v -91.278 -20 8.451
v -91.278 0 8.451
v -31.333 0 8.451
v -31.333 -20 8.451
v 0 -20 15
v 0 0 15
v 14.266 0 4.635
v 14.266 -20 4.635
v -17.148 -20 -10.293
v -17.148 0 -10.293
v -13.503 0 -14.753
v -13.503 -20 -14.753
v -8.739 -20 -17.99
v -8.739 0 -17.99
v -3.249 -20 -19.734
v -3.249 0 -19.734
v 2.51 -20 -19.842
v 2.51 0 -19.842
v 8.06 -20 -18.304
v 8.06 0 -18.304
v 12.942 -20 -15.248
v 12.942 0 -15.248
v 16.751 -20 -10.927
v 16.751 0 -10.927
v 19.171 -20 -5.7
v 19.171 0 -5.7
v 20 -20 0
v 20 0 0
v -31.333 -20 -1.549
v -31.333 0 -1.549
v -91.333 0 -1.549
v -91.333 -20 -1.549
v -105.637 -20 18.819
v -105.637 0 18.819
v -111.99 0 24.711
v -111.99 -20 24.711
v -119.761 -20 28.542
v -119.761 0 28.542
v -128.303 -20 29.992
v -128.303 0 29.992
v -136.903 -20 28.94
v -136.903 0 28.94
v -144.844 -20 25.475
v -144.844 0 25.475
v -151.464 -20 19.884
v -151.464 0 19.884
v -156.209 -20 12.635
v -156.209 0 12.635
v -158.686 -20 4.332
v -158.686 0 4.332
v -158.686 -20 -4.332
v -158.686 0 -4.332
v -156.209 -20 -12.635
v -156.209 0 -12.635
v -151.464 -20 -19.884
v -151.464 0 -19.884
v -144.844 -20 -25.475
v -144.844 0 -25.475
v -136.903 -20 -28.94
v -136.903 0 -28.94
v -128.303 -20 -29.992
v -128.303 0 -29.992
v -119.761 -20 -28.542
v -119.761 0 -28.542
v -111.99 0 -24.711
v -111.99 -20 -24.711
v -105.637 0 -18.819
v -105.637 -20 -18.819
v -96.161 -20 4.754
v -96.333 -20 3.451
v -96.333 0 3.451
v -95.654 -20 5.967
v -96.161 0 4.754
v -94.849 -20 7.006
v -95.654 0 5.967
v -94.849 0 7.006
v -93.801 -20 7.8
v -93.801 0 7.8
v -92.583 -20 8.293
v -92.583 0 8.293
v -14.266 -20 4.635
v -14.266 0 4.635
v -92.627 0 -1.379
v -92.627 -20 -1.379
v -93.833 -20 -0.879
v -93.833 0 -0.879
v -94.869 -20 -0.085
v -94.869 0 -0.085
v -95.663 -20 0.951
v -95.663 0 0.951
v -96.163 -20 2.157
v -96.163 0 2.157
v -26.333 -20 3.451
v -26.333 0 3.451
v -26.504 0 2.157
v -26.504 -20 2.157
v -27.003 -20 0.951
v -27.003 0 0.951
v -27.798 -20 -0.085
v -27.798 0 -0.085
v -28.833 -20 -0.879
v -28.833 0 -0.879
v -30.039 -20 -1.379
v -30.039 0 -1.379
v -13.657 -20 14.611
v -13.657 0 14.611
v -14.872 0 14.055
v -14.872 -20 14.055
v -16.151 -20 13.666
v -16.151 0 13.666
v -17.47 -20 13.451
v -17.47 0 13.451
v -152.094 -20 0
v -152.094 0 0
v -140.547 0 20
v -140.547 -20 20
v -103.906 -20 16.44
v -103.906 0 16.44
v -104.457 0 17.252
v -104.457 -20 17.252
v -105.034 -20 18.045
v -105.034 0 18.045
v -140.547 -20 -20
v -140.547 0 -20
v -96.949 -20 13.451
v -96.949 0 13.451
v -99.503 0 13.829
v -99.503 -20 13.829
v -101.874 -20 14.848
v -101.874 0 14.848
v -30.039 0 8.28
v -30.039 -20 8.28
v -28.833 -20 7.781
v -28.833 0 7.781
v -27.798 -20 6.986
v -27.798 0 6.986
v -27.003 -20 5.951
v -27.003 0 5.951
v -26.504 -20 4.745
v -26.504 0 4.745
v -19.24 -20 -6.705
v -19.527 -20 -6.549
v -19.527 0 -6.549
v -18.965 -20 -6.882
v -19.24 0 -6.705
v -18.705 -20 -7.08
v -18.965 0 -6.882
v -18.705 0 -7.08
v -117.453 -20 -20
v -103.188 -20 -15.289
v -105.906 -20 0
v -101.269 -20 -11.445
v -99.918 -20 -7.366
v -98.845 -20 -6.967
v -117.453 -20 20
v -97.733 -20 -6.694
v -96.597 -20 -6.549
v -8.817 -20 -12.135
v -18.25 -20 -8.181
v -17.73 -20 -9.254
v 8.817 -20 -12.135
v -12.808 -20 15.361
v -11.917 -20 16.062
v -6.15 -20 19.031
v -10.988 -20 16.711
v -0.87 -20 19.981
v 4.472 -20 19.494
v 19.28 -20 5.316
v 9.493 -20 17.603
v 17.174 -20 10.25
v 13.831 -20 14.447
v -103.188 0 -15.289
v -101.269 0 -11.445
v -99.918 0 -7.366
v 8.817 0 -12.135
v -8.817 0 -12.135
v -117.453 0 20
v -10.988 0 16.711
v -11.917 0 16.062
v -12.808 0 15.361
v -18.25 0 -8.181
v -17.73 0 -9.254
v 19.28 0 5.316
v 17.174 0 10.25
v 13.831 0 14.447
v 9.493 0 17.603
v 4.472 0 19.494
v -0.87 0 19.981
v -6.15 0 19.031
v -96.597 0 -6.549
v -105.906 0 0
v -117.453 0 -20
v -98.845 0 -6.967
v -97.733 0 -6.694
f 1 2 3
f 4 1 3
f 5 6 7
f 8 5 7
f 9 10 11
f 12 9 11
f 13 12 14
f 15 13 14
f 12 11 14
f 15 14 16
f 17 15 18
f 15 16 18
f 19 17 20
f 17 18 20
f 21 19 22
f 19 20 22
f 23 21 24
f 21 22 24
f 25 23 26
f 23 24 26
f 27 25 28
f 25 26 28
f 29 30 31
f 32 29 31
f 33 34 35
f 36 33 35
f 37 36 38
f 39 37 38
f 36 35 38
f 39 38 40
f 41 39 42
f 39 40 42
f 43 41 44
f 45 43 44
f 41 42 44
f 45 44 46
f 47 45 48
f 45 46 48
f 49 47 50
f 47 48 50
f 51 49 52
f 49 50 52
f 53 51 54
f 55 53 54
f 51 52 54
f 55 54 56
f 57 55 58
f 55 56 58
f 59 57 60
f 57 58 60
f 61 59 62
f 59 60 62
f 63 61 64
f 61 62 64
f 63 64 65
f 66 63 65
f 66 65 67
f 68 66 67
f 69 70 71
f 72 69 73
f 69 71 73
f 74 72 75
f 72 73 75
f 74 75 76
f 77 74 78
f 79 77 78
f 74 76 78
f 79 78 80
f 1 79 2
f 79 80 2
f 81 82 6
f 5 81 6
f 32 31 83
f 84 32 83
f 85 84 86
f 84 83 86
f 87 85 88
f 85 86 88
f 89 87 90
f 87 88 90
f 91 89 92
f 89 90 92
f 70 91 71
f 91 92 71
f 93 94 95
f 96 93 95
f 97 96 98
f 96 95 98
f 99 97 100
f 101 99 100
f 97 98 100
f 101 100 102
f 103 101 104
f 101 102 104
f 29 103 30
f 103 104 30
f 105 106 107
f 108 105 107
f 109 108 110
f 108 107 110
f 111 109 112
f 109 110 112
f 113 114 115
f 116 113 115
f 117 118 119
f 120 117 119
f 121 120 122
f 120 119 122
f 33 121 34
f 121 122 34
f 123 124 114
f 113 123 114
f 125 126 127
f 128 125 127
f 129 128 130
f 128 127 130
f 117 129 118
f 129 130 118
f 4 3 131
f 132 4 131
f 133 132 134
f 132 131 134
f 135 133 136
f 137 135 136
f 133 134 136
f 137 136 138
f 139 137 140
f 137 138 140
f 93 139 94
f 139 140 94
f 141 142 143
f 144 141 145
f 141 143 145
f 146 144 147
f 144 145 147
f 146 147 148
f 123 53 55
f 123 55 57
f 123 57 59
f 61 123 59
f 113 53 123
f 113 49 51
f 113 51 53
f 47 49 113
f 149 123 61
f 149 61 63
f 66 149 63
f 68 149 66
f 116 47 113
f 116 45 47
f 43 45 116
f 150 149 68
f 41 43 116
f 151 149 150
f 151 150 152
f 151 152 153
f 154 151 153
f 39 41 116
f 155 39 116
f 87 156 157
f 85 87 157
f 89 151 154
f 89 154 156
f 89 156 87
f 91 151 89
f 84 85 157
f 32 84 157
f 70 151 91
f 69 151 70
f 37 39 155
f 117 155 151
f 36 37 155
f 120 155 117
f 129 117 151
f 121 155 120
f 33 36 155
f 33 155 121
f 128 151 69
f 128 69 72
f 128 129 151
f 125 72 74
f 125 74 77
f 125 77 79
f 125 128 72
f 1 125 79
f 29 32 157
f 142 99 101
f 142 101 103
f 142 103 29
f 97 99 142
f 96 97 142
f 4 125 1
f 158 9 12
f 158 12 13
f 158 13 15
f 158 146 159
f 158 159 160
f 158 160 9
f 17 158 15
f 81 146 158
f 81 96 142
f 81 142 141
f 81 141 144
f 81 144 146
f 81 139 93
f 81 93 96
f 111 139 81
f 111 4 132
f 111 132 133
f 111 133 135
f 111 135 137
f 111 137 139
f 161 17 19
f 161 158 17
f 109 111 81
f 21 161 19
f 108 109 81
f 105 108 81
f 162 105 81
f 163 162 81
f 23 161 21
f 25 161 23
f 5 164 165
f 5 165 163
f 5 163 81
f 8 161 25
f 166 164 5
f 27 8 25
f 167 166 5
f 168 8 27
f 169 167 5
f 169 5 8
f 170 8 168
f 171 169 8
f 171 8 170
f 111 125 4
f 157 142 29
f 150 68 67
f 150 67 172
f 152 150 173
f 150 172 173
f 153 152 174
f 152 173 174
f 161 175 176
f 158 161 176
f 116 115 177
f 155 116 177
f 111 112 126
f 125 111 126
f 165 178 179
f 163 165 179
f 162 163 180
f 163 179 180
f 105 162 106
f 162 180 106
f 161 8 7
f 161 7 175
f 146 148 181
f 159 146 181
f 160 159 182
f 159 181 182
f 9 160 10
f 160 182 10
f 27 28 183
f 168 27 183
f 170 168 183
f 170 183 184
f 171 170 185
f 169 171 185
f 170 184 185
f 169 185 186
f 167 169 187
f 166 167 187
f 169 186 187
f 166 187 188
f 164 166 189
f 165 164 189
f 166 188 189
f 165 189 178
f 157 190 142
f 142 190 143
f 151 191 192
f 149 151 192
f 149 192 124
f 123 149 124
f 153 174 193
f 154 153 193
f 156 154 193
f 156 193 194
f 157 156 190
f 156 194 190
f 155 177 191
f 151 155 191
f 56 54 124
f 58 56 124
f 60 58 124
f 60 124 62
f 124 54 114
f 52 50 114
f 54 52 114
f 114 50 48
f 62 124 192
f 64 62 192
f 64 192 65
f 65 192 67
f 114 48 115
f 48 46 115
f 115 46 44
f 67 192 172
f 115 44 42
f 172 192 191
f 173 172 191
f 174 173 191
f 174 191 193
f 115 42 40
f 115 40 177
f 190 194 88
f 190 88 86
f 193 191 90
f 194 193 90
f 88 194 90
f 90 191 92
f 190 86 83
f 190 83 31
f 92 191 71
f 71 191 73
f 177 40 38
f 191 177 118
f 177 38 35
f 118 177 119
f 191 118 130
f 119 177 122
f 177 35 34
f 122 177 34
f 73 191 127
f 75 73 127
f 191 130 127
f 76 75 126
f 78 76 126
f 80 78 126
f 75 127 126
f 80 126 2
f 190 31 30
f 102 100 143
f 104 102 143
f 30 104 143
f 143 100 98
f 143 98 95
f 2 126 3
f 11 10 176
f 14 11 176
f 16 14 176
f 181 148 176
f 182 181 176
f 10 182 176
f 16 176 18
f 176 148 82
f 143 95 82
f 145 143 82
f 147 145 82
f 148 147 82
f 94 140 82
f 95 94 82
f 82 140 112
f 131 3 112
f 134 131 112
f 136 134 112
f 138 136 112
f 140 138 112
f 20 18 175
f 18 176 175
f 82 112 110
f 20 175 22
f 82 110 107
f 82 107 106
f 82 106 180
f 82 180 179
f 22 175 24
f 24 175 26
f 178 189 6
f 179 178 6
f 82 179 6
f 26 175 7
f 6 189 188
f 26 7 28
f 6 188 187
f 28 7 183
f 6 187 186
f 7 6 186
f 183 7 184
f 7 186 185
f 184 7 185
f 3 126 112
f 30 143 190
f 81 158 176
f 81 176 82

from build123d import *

# Parameters (mm, degrees)
F1_DEPTH = 20


with BuildPart() as f1:
    # F0 (on Front) → F1 (new body)
    with BuildSketch(Plane.XZ):
        with BuildLine():
            ThreePointArc((-17.147831, -10.293294), (5.34057, -19.273773), (20, 0))
            ThreePointArc((20, 0), (9.493262, 17.603351), (-10.987798, 16.711323))
            ThreePointArc((-10.987798, 16.711323), (-12.232653, 15.54701), (-13.657159, 14.611023))
            ThreePointArc((-13.657159, 14.611023), (-14.240981, 14.042594), (-14.801165, 13.450856))
            ThreePointArc((-14.801165, 13.450856), (-19.593289, 4.012858), (-18.89732, -6.549144))
            ThreePointArc((-18.89732, -6.549144), (-18.803044, -6.815095), (-18.705026, -7.079689))
            ThreePointArc((-18.705026, -7.079689), (-17.574185, -8.515807), (-17.147831, -10.293294))
        make_face()
        Polygon((0, 15), (14.265848, 4.635255), (8.816779, -12.135255), (-8.816779, -12.135255), (-14.265848, 4.635255), align=None, mode=Mode.SUBTRACT)
        with BuildLine():
            ThreePointArc((-13.657159, 14.611023), (-12.232653, 15.54701), (-10.987798, 16.711323))
            ThreePointArc((-10.987798, 16.711323), (-12.367146, 15.717942), (-13.657159, 14.611023))
        make_face()
        with BuildLine():
            ThreePointArc((-18.705026, -7.079689), (-17.998296, -8.721316), (-17.147831, -10.293294))
            ThreePointArc((-17.147831, -10.293294), (-17.574185, -8.515807), (-18.705026, -7.079689))
        make_face()
        with BuildLine():
            ThreePointArc((-14.801165, 13.450856), (-14.240981, 14.042594), (-13.657159, 14.611023))
            ThreePointArc((-13.657159, 14.611023), (-15.505162, 13.839074), (-17.469928, 13.450856))
            Line((-17.469928, 13.450856), (-14.801165, 13.450856))
        make_face()
        with BuildLine():
            ThreePointArc((-19.527159, -6.549144), (-19.100839, -6.79078), (-18.705026, -7.079689))
            ThreePointArc((-18.705026, -7.079689), (-18.803044, -6.815095), (-18.89732, -6.549144))
            Line((-18.89732, -6.549144), (-19.527159, -6.549144))
        make_face()
        with BuildLine():
            ThreePointArc((-18.89732, -6.549144), (-19.593289, 4.012858), (-14.801165, 13.450856))
            Line((-14.801165, 13.450856), (-17.469928, 13.450856))
            ThreePointArc((-17.469928, 13.450856), (-18.416226, 13.405981), (-19.362524, 13.450856))
            Line((-19.362524, 13.450856), (-96.597262, 13.450856))
            ThreePointArc((-96.597262, 13.450856), (-96.773372, 13.449305), (-96.949482, 13.450856))
            Line((-96.949482, 13.450856), (-102.184436, 13.450856))
            ThreePointArc((-102.184436, 13.450856), (-99.806962, 6.911334), (-99, 0))
            ThreePointArc((-99, 0), (-99.181444, -3.294498), (-99.723581, -6.549144))
            Line((-99.723581, -6.549144), (-96.597262, -6.549144))
            Line((-96.597262, -6.549144), (-23.303071, -6.549144))
            ThreePointArc((-23.303071, -6.549144), (-21.415115, -6.108877), (-19.527159, -6.549144))
            Line((-19.527159, -6.549144), (-18.89732, -6.549144))
        make_face()
        with BuildLine():
            Line((-96.333308, 3.450856), (-96.333308, 3.451164))
            ThreePointArc((-96.333308, 3.451164), (-94.849143, 7.006289), (-91.277745, 8.450856))
            Line((-91.277745, 8.450856), (-31.333308, 8.450856))
            ThreePointArc((-31.333308, 8.450856), (-27.797775, 6.98639), (-26.333308, 3.450856))
            ThreePointArc((-26.333308, 3.450856), (-27.797775, -0.084678), (-31.333308, -1.549144))
            Line((-31.333308, -1.549144), (-91.333308, -1.549144))
            ThreePointArc((-91.333308, -1.549144), (-94.868842, -0.084678), (-96.333308, 3.450856))
        make_face(mode=Mode.SUBTRACT)
        with BuildLine():
            ThreePointArc((-19.362524, 13.450856), (-18.416226, 13.405981), (-17.469928, 13.450856))
            Line((-17.469928, 13.450856), (-19.362524, 13.450856))
        make_face()
        with BuildLine():
            Line((-23.303071, -6.549144), (-19.527159, -6.549144))
            ThreePointArc((-19.527159, -6.549144), (-21.415115, -6.108877), (-23.303071, -6.549144))
        make_face()
        with BuildLine():
            ThreePointArc((-96.949482, 13.450856), (-96.773372, 13.449305), (-96.597262, 13.450856))
            Line((-96.597262, 13.450856), (-96.949482, 13.450856))
        make_face()
        with BuildLine():
            ThreePointArc((-99.918438, -7.366324), (-98.293046, -6.814691), (-96.597262, -6.549144))
            Line((-96.597262, -6.549144), (-99.723581, -6.549144))
            ThreePointArc((-99.723581, -6.549144), (-99.818149, -6.958416), (-99.918438, -7.366324))
        make_face()
        with BuildLine():
            Line((-102.184436, 13.450856), (-96.949482, 13.450856))
            ThreePointArc((-96.949482, 13.450856), (-100.721368, 14.261632), (-103.905615, 16.439946))
            ThreePointArc((-103.905615, 16.439946), (-103.002031, 14.970158), (-102.184436, 13.450856))
        make_face()
        with BuildLine():
            ThreePointArc((-99.918438, -7.366324), (-99.818149, -6.958416), (-99.723581, -6.549144))
            ThreePointArc((-99.723581, -6.549144), (-99.181444, -3.294498), (-99, 0))
            ThreePointArc((-99, 0), (-99.806962, 6.911334), (-102.184436, 13.450856))
            ThreePointArc((-102.184436, 13.450856), (-103.002031, 14.970158), (-103.905615, 16.439946))
            ThreePointArc((-103.905615, 16.439946), (-104.859329, 17.565659), (-105.637028, 18.819446))
            ThreePointArc((-105.637028, 18.819446), (-159, 0), (-105.637028, -18.819446))
            ThreePointArc((-105.637028, -18.819446), (-104.850555, -12.057916), (-99.918438, -7.366324))
        make_face()
        Polygon((-117.452995, 20), (-105.905989, 0), (-117.452995, -20), (-140.547005, -20), (-152.094011, 0), (-140.547005, 20), align=None, mode=Mode.SUBTRACT)
        with BuildLine():
            ThreePointArc((-105.637028, -18.819446), (-102.159717, -13.401463), (-99.918438, -7.366324))
            ThreePointArc((-99.918438, -7.366324), (-104.850555, -12.057916), (-105.637028, -18.819446))
        make_face()
        with BuildLine():
            ThreePointArc((-105.637028, 18.819446), (-104.859329, 17.565659), (-103.905615, 16.439946))
            ThreePointArc((-103.905615, 16.439946), (-104.742128, 17.650939), (-105.637028, 18.819446))
        make_face()
    extrude(amount=F1_DEPTH)


solid = f1.part
